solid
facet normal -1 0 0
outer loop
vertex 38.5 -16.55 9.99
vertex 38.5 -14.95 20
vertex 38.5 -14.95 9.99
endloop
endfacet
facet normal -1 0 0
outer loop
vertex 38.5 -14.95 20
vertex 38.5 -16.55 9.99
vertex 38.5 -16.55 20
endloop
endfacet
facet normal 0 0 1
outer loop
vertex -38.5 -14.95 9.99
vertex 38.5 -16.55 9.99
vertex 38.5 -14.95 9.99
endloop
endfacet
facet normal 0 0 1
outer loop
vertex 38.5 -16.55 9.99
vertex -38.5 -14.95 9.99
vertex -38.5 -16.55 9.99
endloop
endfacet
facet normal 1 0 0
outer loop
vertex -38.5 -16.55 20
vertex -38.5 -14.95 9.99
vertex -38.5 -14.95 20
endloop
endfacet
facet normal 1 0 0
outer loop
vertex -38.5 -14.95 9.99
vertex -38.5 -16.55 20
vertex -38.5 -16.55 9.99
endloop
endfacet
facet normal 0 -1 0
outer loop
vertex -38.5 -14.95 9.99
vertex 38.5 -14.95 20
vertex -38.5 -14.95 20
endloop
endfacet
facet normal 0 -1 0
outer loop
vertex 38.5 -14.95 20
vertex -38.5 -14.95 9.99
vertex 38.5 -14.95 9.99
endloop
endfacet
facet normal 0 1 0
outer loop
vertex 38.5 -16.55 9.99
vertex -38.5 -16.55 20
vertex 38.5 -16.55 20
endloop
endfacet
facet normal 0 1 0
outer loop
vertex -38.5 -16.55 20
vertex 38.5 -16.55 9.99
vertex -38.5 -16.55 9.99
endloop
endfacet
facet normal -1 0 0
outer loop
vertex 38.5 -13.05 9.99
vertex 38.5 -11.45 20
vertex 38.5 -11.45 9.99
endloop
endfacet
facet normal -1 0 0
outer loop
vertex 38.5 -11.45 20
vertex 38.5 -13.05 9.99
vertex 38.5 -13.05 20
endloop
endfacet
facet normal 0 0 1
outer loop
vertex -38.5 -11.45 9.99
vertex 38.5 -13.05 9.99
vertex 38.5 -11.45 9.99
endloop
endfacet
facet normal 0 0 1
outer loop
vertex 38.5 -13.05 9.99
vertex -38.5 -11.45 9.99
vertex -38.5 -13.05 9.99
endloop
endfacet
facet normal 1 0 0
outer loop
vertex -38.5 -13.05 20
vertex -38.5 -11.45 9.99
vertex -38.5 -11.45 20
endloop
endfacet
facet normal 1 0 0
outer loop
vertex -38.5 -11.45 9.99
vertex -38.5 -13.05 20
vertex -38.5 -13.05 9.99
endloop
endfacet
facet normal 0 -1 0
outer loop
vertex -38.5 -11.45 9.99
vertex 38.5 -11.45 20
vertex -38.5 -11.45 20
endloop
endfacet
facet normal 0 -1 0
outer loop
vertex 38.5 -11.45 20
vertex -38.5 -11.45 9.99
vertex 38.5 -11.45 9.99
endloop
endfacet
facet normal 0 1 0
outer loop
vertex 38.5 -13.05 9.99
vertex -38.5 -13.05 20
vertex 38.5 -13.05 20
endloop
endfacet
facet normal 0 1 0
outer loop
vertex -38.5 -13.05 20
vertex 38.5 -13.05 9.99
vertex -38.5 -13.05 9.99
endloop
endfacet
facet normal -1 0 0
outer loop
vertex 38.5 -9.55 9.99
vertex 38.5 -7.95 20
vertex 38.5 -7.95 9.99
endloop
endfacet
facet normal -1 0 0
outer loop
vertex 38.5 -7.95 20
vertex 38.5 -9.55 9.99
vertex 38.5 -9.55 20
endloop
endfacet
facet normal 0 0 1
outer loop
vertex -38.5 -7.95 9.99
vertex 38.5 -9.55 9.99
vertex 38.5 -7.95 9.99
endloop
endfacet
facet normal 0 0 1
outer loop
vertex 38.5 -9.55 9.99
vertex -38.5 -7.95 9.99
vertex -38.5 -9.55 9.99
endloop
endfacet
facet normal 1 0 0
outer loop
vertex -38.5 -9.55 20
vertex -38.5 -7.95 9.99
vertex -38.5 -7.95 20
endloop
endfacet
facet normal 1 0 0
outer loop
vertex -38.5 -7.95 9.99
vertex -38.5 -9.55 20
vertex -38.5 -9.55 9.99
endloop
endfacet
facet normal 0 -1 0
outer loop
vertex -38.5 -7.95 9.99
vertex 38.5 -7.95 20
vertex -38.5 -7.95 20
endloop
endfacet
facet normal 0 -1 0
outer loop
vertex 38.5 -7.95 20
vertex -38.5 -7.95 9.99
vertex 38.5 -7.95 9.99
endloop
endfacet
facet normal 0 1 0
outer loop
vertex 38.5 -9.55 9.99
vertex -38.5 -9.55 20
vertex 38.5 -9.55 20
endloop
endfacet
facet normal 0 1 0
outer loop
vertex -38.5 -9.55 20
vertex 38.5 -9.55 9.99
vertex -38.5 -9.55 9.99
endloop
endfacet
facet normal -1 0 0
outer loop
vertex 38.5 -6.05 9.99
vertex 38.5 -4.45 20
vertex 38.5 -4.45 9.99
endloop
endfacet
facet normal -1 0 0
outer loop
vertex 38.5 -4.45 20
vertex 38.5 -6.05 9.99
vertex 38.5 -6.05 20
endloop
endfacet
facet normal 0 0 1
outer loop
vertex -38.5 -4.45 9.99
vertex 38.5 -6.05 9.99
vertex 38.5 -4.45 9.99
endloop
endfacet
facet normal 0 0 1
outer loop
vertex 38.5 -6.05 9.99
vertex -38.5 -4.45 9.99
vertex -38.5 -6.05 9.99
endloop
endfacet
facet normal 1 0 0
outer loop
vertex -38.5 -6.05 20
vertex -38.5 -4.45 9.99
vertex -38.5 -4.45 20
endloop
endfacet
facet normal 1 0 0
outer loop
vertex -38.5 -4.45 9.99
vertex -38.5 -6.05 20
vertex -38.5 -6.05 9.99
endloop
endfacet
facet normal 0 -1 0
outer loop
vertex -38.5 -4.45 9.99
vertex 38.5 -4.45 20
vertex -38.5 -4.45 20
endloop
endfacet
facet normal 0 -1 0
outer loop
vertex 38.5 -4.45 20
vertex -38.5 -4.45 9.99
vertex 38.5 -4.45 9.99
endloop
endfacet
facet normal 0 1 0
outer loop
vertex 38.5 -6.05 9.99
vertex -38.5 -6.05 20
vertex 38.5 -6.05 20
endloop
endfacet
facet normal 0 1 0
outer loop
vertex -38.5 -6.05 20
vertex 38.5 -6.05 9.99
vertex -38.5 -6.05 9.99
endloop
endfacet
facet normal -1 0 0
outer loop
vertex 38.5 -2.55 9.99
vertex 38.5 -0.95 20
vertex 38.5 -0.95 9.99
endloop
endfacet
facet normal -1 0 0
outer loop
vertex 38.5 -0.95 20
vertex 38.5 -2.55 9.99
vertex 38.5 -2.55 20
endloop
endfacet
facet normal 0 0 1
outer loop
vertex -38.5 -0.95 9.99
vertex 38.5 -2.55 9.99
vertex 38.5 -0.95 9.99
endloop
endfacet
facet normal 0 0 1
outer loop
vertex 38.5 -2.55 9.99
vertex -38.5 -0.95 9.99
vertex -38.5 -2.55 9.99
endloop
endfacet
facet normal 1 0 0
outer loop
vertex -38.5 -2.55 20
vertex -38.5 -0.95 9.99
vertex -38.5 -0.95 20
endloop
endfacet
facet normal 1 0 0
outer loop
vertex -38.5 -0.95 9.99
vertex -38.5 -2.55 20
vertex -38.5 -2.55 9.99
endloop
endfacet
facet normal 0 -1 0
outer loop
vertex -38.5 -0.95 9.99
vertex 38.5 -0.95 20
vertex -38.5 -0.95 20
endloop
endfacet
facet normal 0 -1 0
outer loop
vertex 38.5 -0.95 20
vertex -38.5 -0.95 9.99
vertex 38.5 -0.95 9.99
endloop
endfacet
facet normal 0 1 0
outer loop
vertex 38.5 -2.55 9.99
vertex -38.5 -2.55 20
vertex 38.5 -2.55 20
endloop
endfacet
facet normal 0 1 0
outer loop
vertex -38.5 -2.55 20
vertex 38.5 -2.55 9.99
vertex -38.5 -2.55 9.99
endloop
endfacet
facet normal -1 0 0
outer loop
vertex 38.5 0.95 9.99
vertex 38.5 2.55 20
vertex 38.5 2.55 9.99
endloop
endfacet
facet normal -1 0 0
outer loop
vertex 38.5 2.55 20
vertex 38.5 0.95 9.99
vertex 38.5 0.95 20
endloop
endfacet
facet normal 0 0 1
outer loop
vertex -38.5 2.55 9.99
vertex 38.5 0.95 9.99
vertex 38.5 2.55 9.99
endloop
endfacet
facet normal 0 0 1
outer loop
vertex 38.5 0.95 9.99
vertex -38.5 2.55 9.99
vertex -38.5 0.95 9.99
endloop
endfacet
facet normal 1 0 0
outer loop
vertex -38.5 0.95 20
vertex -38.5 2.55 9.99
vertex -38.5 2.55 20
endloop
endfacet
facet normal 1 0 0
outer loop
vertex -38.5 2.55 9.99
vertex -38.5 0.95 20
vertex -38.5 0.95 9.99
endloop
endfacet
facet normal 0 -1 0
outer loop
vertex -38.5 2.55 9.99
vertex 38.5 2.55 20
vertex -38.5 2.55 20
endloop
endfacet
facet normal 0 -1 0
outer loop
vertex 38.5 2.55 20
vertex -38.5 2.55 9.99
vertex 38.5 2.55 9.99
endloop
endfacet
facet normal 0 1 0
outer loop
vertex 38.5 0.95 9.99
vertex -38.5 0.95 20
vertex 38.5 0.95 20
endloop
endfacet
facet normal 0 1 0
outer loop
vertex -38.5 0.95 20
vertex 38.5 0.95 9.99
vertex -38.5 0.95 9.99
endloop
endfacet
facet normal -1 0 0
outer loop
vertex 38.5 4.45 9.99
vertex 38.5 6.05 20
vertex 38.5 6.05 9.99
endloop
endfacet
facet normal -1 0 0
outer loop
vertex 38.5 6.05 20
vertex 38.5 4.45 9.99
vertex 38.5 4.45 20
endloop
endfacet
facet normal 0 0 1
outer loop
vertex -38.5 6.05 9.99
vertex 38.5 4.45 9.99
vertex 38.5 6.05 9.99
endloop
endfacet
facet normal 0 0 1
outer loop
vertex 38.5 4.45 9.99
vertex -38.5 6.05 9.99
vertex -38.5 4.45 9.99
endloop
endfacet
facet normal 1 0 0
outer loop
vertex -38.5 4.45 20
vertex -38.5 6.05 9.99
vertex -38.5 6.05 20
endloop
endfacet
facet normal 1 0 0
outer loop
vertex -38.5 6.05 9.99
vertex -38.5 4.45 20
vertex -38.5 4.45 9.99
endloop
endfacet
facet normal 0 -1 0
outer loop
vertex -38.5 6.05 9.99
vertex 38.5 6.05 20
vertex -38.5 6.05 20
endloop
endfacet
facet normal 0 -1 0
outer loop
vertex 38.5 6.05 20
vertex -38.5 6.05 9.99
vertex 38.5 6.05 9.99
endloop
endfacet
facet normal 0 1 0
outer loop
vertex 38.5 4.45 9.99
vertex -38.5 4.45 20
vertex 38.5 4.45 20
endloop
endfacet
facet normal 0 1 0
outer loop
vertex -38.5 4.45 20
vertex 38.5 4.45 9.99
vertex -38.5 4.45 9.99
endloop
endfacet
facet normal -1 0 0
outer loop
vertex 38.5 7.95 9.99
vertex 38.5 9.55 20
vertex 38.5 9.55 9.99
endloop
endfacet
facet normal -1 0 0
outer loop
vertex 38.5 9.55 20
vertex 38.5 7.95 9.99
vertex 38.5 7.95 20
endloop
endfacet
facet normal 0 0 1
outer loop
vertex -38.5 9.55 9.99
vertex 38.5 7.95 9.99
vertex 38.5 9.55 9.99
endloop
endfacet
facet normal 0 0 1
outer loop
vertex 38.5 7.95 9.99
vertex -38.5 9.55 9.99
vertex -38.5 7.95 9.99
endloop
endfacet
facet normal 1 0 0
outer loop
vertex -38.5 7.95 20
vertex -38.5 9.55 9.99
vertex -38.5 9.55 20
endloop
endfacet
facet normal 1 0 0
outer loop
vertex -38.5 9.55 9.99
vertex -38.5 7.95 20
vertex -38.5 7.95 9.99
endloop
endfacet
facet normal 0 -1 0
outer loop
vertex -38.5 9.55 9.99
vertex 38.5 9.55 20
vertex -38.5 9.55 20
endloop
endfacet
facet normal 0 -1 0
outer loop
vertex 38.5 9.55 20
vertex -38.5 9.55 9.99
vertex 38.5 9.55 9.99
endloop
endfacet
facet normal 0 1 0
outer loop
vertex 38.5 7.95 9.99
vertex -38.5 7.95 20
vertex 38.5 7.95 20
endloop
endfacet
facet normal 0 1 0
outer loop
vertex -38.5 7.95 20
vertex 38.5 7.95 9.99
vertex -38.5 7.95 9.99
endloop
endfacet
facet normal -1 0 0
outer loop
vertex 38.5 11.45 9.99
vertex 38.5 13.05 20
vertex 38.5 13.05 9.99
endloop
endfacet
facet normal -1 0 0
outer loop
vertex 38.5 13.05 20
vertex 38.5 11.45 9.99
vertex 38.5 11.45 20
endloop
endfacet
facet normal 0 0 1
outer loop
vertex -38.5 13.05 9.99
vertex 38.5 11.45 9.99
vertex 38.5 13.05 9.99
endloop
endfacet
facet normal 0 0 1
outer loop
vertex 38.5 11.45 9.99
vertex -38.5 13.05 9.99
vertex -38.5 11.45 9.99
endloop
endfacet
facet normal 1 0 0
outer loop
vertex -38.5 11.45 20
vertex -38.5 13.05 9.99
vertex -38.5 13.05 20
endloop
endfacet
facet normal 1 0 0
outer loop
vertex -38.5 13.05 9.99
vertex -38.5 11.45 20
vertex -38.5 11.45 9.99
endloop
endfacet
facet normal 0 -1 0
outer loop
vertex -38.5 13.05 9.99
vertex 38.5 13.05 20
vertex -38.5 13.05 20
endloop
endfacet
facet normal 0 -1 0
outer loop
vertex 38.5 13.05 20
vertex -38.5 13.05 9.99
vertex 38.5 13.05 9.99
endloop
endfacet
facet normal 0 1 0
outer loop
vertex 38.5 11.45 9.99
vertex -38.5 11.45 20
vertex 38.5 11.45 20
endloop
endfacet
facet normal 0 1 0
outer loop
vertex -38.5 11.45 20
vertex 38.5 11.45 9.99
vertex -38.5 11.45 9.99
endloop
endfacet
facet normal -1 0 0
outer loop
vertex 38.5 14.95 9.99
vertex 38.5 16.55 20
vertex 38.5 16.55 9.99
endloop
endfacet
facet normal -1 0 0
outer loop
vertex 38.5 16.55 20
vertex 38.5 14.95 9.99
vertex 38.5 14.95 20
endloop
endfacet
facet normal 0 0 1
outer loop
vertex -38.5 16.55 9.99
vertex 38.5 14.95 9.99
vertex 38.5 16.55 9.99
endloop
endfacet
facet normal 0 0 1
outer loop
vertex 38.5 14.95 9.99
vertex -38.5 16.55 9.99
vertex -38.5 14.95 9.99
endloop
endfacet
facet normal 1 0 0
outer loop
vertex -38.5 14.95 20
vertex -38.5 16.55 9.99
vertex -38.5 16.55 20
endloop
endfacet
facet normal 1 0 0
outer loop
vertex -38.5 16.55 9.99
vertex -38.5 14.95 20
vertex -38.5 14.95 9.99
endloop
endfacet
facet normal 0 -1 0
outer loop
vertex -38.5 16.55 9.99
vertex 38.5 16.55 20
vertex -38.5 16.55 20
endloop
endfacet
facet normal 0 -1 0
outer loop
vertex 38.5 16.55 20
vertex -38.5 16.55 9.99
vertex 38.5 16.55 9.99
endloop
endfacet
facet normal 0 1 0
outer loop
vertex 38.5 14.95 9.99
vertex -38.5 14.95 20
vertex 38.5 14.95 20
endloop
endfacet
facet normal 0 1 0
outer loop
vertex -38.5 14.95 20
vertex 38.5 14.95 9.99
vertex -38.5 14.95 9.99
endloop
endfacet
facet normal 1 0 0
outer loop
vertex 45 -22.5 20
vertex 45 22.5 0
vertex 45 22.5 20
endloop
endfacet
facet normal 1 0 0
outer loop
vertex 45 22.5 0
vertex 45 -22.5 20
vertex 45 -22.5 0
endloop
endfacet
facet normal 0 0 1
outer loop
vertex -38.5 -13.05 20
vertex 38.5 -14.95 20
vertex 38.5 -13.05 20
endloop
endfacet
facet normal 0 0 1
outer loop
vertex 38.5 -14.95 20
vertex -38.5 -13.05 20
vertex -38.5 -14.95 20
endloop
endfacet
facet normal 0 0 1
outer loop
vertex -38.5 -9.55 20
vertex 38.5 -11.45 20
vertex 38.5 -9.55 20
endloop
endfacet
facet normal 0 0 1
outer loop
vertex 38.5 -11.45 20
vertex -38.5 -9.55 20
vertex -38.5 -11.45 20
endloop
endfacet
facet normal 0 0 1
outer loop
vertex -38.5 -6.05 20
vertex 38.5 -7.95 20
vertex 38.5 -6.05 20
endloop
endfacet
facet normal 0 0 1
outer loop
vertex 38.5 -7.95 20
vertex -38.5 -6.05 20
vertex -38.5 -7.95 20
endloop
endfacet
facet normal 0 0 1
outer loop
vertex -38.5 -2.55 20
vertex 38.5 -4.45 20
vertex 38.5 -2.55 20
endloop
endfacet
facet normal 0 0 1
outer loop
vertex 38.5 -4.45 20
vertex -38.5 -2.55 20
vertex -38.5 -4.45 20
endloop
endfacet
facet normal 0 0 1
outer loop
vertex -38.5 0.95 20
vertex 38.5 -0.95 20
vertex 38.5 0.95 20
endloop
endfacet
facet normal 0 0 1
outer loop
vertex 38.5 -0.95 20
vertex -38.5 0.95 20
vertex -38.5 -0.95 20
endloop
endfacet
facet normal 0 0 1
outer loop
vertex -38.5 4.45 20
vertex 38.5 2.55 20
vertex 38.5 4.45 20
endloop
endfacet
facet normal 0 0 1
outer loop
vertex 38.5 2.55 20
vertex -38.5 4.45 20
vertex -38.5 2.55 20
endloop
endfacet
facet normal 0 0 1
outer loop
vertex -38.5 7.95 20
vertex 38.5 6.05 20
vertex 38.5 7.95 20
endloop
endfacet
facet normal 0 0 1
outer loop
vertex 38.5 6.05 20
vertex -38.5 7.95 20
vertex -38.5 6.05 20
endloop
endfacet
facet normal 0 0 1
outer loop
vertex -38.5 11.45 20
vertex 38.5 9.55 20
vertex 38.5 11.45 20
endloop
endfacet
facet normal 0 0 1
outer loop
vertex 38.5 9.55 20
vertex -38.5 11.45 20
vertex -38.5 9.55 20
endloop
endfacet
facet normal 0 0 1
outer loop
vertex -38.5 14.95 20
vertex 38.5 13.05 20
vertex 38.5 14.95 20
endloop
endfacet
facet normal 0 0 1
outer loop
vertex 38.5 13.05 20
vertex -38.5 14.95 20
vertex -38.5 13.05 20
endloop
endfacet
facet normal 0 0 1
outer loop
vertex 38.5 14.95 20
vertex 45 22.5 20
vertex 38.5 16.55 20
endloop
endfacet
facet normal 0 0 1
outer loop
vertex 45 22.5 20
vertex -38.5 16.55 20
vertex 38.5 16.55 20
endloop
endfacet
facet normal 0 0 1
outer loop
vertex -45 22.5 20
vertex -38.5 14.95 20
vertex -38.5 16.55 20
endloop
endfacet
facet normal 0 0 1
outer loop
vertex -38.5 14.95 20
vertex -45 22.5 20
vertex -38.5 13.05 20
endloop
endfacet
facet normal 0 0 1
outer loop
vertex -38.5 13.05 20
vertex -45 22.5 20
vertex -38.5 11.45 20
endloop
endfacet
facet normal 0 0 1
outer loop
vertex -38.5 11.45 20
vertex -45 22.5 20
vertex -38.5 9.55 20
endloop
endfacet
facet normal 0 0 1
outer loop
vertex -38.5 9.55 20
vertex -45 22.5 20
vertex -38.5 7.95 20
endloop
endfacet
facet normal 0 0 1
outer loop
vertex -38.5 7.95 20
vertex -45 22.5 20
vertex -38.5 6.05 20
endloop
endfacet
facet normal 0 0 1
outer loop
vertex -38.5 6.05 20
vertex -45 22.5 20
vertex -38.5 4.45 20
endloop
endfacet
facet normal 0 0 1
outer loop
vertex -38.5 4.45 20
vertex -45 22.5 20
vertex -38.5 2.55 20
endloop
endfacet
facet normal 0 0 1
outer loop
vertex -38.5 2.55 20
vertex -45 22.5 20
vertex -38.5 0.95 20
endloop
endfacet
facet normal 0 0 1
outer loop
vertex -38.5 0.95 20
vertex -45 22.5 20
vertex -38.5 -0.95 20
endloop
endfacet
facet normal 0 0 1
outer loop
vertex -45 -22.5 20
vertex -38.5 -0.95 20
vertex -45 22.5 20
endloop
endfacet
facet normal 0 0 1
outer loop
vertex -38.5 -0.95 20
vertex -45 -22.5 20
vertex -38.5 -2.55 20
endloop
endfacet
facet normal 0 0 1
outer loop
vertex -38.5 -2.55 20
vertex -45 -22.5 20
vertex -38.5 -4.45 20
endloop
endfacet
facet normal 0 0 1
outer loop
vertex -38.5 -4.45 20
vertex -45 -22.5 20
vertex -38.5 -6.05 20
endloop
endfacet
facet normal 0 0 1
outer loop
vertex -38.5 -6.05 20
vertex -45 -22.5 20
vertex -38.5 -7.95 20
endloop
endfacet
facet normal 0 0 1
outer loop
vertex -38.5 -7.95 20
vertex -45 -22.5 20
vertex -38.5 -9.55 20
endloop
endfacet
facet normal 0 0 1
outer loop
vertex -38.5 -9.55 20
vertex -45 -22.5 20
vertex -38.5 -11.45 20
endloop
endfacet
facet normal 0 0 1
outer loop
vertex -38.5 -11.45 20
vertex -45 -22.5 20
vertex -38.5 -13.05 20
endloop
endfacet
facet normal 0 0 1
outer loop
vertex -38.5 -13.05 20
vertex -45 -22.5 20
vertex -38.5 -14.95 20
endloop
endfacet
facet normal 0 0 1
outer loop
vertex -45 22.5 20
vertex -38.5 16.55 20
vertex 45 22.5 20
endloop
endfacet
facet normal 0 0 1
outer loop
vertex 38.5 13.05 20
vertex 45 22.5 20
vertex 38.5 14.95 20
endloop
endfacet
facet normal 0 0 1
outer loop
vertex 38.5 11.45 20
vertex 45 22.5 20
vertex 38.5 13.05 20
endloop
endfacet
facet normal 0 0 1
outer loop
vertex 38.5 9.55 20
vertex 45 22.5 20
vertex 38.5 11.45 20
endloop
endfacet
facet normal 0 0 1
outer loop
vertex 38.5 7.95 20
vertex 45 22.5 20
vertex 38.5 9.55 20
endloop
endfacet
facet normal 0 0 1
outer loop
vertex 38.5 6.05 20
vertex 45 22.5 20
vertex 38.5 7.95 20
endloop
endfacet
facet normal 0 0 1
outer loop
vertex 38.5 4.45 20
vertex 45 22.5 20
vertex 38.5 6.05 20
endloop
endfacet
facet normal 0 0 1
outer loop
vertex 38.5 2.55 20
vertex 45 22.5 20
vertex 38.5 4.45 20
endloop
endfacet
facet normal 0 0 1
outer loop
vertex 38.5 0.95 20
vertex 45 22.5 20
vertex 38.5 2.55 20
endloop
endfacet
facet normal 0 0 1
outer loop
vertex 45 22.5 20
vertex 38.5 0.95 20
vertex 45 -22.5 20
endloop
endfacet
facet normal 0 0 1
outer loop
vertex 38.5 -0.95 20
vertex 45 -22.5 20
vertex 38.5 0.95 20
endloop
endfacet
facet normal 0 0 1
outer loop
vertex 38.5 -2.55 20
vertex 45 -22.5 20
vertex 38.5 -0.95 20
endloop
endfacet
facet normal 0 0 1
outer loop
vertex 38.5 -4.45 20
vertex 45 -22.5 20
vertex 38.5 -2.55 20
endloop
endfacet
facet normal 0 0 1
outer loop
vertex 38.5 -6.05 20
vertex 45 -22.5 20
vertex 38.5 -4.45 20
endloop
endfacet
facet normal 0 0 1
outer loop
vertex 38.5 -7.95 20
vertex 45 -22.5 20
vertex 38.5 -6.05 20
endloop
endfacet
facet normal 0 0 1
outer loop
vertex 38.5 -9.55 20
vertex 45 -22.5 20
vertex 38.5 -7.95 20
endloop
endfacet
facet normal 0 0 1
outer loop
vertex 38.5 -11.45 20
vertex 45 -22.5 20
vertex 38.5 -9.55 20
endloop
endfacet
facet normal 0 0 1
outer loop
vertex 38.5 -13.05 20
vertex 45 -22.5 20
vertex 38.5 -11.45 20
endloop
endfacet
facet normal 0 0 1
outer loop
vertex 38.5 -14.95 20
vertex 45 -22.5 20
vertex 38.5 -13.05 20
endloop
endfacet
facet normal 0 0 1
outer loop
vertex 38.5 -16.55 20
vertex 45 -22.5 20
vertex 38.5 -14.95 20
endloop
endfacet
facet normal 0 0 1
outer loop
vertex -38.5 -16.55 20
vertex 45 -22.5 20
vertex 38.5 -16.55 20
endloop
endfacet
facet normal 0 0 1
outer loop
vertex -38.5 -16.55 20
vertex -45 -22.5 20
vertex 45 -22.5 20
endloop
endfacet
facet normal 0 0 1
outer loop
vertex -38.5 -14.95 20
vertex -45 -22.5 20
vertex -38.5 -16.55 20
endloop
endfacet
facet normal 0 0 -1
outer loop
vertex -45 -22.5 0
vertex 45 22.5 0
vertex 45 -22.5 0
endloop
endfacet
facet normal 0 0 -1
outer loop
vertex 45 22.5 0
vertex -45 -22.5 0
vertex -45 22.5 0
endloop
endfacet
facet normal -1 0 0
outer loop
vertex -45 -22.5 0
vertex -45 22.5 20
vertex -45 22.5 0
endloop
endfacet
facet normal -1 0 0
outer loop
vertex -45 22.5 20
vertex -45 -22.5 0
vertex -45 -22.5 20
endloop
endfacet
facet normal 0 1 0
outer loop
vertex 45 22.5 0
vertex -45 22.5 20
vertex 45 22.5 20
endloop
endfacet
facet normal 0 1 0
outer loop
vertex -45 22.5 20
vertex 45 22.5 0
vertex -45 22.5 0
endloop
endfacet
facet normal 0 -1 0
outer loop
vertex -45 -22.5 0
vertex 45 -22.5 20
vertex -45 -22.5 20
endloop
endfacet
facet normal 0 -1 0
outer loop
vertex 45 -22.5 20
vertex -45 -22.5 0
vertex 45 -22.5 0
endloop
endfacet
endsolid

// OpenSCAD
// Microscope slide drying rack

// Base block dimensions
base_length = 90;      // X dimension of base block (mm)
base_width = 45;       // Y dimension of base block (mm)
base_height = 20;      // Z dimension of base block (mm)

// Slot dimensions
slot_length = 77;      // Length of each slot along X (mm)
slot_width = 1.6;      // Width of each slot in Y direction (mm)
slot_depth = 10;       // Depth of each slot in Z direction (mm)

// Slot layout
num_slots = 10;        // Number of slots
slot_spacing = 3.5;    // Center-to-center spacing between slots in Y (mm)

// Derived dimensions
slot_group_span = (num_slots - 1) * slot_spacing;  // Total span of slot group in Y (31.5 mm)

$fn = 64;

difference() {
    // Create base block (centered at origin in X and Y, from z=0 to z=20)
    translate([0, 0, base_height/2]) {
        cube([base_length, base_width, base_height], center = true);
    }
    
    // Cut 10 parallel slots
    for (i = [0 : num_slots - 1]) {
        // Y position of current slot (centered in Y)
        slot_y = -slot_group_span / 2 + i * slot_spacing;
        
        // Remove slot with a cube that extends slightly past Z boundaries to avoid coplanar faces
        translate([0, slot_y, base_height - slot_depth/2]) {
            cube([slot_length, slot_width, slot_depth + 0.02], center = true);
        }
    }
}
